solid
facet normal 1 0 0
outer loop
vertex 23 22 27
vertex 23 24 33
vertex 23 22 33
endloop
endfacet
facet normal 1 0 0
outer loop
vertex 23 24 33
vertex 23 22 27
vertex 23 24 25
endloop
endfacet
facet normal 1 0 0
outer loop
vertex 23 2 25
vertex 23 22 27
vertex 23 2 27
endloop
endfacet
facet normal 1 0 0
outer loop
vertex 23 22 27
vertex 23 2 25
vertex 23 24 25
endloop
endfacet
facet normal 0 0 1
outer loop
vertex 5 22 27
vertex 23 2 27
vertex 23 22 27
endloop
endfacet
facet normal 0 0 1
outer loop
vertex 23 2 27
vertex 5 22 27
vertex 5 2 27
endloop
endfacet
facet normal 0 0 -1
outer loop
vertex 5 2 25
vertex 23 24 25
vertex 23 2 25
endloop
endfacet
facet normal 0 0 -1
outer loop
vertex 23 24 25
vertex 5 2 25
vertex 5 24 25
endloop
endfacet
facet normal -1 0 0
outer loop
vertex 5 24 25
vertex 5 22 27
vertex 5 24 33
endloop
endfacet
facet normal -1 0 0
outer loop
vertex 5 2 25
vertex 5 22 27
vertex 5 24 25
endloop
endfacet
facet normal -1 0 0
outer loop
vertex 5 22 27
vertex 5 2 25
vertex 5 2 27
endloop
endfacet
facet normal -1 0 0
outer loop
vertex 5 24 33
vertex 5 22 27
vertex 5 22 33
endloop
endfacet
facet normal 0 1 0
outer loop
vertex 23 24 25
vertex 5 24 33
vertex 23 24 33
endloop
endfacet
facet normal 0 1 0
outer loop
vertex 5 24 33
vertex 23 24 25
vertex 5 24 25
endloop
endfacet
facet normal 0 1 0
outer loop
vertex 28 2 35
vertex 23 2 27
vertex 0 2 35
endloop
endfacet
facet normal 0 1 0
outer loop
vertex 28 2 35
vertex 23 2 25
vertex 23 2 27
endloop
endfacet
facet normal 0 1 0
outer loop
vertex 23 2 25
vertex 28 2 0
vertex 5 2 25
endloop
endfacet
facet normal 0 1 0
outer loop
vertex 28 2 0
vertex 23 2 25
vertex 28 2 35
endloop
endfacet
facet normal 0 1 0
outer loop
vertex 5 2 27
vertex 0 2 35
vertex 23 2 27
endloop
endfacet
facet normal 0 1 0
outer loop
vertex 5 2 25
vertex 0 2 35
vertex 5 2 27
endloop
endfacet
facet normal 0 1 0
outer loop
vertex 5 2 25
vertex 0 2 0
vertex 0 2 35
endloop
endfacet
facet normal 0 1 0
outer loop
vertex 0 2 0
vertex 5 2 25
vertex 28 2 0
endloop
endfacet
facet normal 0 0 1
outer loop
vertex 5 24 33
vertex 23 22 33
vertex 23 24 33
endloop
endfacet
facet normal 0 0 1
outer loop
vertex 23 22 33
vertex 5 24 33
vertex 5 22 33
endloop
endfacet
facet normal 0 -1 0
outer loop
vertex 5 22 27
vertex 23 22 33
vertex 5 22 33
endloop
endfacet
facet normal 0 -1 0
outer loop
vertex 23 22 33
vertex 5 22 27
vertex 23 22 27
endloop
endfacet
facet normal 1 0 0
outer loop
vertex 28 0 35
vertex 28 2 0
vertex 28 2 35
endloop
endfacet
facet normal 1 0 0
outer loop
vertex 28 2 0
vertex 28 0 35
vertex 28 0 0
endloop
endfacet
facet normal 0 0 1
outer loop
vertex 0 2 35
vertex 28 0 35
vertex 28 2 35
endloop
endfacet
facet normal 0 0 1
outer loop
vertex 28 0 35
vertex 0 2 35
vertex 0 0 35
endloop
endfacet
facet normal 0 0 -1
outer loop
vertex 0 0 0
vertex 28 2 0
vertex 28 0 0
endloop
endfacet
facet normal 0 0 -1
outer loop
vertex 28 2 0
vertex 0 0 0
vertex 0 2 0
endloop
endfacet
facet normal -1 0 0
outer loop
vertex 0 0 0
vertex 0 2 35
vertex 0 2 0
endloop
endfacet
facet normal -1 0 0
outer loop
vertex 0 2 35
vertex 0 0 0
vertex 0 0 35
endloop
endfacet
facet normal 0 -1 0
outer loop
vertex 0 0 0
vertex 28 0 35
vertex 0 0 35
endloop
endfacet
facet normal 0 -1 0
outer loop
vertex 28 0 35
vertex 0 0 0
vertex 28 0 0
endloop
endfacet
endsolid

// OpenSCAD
// Wall hook — back plate + L-shaped hook arm
hook_w = 18;
hook_d = 22;
wall = 2.0;
back_h = 35;
back_w = 28;
lip_h = 8;
$fn = 32;

module hook_arm() {
  union() {
    cube([hook_w, hook_d, wall]);
    translate([0, hook_d - wall, 0])
      cube([hook_w, wall, lip_h]);
  }
}

union() {
  cube([back_w, wall, back_h]);
  translate([(back_w - hook_w) / 2, wall, back_h - wall - lip_h])
    hook_arm();
}
